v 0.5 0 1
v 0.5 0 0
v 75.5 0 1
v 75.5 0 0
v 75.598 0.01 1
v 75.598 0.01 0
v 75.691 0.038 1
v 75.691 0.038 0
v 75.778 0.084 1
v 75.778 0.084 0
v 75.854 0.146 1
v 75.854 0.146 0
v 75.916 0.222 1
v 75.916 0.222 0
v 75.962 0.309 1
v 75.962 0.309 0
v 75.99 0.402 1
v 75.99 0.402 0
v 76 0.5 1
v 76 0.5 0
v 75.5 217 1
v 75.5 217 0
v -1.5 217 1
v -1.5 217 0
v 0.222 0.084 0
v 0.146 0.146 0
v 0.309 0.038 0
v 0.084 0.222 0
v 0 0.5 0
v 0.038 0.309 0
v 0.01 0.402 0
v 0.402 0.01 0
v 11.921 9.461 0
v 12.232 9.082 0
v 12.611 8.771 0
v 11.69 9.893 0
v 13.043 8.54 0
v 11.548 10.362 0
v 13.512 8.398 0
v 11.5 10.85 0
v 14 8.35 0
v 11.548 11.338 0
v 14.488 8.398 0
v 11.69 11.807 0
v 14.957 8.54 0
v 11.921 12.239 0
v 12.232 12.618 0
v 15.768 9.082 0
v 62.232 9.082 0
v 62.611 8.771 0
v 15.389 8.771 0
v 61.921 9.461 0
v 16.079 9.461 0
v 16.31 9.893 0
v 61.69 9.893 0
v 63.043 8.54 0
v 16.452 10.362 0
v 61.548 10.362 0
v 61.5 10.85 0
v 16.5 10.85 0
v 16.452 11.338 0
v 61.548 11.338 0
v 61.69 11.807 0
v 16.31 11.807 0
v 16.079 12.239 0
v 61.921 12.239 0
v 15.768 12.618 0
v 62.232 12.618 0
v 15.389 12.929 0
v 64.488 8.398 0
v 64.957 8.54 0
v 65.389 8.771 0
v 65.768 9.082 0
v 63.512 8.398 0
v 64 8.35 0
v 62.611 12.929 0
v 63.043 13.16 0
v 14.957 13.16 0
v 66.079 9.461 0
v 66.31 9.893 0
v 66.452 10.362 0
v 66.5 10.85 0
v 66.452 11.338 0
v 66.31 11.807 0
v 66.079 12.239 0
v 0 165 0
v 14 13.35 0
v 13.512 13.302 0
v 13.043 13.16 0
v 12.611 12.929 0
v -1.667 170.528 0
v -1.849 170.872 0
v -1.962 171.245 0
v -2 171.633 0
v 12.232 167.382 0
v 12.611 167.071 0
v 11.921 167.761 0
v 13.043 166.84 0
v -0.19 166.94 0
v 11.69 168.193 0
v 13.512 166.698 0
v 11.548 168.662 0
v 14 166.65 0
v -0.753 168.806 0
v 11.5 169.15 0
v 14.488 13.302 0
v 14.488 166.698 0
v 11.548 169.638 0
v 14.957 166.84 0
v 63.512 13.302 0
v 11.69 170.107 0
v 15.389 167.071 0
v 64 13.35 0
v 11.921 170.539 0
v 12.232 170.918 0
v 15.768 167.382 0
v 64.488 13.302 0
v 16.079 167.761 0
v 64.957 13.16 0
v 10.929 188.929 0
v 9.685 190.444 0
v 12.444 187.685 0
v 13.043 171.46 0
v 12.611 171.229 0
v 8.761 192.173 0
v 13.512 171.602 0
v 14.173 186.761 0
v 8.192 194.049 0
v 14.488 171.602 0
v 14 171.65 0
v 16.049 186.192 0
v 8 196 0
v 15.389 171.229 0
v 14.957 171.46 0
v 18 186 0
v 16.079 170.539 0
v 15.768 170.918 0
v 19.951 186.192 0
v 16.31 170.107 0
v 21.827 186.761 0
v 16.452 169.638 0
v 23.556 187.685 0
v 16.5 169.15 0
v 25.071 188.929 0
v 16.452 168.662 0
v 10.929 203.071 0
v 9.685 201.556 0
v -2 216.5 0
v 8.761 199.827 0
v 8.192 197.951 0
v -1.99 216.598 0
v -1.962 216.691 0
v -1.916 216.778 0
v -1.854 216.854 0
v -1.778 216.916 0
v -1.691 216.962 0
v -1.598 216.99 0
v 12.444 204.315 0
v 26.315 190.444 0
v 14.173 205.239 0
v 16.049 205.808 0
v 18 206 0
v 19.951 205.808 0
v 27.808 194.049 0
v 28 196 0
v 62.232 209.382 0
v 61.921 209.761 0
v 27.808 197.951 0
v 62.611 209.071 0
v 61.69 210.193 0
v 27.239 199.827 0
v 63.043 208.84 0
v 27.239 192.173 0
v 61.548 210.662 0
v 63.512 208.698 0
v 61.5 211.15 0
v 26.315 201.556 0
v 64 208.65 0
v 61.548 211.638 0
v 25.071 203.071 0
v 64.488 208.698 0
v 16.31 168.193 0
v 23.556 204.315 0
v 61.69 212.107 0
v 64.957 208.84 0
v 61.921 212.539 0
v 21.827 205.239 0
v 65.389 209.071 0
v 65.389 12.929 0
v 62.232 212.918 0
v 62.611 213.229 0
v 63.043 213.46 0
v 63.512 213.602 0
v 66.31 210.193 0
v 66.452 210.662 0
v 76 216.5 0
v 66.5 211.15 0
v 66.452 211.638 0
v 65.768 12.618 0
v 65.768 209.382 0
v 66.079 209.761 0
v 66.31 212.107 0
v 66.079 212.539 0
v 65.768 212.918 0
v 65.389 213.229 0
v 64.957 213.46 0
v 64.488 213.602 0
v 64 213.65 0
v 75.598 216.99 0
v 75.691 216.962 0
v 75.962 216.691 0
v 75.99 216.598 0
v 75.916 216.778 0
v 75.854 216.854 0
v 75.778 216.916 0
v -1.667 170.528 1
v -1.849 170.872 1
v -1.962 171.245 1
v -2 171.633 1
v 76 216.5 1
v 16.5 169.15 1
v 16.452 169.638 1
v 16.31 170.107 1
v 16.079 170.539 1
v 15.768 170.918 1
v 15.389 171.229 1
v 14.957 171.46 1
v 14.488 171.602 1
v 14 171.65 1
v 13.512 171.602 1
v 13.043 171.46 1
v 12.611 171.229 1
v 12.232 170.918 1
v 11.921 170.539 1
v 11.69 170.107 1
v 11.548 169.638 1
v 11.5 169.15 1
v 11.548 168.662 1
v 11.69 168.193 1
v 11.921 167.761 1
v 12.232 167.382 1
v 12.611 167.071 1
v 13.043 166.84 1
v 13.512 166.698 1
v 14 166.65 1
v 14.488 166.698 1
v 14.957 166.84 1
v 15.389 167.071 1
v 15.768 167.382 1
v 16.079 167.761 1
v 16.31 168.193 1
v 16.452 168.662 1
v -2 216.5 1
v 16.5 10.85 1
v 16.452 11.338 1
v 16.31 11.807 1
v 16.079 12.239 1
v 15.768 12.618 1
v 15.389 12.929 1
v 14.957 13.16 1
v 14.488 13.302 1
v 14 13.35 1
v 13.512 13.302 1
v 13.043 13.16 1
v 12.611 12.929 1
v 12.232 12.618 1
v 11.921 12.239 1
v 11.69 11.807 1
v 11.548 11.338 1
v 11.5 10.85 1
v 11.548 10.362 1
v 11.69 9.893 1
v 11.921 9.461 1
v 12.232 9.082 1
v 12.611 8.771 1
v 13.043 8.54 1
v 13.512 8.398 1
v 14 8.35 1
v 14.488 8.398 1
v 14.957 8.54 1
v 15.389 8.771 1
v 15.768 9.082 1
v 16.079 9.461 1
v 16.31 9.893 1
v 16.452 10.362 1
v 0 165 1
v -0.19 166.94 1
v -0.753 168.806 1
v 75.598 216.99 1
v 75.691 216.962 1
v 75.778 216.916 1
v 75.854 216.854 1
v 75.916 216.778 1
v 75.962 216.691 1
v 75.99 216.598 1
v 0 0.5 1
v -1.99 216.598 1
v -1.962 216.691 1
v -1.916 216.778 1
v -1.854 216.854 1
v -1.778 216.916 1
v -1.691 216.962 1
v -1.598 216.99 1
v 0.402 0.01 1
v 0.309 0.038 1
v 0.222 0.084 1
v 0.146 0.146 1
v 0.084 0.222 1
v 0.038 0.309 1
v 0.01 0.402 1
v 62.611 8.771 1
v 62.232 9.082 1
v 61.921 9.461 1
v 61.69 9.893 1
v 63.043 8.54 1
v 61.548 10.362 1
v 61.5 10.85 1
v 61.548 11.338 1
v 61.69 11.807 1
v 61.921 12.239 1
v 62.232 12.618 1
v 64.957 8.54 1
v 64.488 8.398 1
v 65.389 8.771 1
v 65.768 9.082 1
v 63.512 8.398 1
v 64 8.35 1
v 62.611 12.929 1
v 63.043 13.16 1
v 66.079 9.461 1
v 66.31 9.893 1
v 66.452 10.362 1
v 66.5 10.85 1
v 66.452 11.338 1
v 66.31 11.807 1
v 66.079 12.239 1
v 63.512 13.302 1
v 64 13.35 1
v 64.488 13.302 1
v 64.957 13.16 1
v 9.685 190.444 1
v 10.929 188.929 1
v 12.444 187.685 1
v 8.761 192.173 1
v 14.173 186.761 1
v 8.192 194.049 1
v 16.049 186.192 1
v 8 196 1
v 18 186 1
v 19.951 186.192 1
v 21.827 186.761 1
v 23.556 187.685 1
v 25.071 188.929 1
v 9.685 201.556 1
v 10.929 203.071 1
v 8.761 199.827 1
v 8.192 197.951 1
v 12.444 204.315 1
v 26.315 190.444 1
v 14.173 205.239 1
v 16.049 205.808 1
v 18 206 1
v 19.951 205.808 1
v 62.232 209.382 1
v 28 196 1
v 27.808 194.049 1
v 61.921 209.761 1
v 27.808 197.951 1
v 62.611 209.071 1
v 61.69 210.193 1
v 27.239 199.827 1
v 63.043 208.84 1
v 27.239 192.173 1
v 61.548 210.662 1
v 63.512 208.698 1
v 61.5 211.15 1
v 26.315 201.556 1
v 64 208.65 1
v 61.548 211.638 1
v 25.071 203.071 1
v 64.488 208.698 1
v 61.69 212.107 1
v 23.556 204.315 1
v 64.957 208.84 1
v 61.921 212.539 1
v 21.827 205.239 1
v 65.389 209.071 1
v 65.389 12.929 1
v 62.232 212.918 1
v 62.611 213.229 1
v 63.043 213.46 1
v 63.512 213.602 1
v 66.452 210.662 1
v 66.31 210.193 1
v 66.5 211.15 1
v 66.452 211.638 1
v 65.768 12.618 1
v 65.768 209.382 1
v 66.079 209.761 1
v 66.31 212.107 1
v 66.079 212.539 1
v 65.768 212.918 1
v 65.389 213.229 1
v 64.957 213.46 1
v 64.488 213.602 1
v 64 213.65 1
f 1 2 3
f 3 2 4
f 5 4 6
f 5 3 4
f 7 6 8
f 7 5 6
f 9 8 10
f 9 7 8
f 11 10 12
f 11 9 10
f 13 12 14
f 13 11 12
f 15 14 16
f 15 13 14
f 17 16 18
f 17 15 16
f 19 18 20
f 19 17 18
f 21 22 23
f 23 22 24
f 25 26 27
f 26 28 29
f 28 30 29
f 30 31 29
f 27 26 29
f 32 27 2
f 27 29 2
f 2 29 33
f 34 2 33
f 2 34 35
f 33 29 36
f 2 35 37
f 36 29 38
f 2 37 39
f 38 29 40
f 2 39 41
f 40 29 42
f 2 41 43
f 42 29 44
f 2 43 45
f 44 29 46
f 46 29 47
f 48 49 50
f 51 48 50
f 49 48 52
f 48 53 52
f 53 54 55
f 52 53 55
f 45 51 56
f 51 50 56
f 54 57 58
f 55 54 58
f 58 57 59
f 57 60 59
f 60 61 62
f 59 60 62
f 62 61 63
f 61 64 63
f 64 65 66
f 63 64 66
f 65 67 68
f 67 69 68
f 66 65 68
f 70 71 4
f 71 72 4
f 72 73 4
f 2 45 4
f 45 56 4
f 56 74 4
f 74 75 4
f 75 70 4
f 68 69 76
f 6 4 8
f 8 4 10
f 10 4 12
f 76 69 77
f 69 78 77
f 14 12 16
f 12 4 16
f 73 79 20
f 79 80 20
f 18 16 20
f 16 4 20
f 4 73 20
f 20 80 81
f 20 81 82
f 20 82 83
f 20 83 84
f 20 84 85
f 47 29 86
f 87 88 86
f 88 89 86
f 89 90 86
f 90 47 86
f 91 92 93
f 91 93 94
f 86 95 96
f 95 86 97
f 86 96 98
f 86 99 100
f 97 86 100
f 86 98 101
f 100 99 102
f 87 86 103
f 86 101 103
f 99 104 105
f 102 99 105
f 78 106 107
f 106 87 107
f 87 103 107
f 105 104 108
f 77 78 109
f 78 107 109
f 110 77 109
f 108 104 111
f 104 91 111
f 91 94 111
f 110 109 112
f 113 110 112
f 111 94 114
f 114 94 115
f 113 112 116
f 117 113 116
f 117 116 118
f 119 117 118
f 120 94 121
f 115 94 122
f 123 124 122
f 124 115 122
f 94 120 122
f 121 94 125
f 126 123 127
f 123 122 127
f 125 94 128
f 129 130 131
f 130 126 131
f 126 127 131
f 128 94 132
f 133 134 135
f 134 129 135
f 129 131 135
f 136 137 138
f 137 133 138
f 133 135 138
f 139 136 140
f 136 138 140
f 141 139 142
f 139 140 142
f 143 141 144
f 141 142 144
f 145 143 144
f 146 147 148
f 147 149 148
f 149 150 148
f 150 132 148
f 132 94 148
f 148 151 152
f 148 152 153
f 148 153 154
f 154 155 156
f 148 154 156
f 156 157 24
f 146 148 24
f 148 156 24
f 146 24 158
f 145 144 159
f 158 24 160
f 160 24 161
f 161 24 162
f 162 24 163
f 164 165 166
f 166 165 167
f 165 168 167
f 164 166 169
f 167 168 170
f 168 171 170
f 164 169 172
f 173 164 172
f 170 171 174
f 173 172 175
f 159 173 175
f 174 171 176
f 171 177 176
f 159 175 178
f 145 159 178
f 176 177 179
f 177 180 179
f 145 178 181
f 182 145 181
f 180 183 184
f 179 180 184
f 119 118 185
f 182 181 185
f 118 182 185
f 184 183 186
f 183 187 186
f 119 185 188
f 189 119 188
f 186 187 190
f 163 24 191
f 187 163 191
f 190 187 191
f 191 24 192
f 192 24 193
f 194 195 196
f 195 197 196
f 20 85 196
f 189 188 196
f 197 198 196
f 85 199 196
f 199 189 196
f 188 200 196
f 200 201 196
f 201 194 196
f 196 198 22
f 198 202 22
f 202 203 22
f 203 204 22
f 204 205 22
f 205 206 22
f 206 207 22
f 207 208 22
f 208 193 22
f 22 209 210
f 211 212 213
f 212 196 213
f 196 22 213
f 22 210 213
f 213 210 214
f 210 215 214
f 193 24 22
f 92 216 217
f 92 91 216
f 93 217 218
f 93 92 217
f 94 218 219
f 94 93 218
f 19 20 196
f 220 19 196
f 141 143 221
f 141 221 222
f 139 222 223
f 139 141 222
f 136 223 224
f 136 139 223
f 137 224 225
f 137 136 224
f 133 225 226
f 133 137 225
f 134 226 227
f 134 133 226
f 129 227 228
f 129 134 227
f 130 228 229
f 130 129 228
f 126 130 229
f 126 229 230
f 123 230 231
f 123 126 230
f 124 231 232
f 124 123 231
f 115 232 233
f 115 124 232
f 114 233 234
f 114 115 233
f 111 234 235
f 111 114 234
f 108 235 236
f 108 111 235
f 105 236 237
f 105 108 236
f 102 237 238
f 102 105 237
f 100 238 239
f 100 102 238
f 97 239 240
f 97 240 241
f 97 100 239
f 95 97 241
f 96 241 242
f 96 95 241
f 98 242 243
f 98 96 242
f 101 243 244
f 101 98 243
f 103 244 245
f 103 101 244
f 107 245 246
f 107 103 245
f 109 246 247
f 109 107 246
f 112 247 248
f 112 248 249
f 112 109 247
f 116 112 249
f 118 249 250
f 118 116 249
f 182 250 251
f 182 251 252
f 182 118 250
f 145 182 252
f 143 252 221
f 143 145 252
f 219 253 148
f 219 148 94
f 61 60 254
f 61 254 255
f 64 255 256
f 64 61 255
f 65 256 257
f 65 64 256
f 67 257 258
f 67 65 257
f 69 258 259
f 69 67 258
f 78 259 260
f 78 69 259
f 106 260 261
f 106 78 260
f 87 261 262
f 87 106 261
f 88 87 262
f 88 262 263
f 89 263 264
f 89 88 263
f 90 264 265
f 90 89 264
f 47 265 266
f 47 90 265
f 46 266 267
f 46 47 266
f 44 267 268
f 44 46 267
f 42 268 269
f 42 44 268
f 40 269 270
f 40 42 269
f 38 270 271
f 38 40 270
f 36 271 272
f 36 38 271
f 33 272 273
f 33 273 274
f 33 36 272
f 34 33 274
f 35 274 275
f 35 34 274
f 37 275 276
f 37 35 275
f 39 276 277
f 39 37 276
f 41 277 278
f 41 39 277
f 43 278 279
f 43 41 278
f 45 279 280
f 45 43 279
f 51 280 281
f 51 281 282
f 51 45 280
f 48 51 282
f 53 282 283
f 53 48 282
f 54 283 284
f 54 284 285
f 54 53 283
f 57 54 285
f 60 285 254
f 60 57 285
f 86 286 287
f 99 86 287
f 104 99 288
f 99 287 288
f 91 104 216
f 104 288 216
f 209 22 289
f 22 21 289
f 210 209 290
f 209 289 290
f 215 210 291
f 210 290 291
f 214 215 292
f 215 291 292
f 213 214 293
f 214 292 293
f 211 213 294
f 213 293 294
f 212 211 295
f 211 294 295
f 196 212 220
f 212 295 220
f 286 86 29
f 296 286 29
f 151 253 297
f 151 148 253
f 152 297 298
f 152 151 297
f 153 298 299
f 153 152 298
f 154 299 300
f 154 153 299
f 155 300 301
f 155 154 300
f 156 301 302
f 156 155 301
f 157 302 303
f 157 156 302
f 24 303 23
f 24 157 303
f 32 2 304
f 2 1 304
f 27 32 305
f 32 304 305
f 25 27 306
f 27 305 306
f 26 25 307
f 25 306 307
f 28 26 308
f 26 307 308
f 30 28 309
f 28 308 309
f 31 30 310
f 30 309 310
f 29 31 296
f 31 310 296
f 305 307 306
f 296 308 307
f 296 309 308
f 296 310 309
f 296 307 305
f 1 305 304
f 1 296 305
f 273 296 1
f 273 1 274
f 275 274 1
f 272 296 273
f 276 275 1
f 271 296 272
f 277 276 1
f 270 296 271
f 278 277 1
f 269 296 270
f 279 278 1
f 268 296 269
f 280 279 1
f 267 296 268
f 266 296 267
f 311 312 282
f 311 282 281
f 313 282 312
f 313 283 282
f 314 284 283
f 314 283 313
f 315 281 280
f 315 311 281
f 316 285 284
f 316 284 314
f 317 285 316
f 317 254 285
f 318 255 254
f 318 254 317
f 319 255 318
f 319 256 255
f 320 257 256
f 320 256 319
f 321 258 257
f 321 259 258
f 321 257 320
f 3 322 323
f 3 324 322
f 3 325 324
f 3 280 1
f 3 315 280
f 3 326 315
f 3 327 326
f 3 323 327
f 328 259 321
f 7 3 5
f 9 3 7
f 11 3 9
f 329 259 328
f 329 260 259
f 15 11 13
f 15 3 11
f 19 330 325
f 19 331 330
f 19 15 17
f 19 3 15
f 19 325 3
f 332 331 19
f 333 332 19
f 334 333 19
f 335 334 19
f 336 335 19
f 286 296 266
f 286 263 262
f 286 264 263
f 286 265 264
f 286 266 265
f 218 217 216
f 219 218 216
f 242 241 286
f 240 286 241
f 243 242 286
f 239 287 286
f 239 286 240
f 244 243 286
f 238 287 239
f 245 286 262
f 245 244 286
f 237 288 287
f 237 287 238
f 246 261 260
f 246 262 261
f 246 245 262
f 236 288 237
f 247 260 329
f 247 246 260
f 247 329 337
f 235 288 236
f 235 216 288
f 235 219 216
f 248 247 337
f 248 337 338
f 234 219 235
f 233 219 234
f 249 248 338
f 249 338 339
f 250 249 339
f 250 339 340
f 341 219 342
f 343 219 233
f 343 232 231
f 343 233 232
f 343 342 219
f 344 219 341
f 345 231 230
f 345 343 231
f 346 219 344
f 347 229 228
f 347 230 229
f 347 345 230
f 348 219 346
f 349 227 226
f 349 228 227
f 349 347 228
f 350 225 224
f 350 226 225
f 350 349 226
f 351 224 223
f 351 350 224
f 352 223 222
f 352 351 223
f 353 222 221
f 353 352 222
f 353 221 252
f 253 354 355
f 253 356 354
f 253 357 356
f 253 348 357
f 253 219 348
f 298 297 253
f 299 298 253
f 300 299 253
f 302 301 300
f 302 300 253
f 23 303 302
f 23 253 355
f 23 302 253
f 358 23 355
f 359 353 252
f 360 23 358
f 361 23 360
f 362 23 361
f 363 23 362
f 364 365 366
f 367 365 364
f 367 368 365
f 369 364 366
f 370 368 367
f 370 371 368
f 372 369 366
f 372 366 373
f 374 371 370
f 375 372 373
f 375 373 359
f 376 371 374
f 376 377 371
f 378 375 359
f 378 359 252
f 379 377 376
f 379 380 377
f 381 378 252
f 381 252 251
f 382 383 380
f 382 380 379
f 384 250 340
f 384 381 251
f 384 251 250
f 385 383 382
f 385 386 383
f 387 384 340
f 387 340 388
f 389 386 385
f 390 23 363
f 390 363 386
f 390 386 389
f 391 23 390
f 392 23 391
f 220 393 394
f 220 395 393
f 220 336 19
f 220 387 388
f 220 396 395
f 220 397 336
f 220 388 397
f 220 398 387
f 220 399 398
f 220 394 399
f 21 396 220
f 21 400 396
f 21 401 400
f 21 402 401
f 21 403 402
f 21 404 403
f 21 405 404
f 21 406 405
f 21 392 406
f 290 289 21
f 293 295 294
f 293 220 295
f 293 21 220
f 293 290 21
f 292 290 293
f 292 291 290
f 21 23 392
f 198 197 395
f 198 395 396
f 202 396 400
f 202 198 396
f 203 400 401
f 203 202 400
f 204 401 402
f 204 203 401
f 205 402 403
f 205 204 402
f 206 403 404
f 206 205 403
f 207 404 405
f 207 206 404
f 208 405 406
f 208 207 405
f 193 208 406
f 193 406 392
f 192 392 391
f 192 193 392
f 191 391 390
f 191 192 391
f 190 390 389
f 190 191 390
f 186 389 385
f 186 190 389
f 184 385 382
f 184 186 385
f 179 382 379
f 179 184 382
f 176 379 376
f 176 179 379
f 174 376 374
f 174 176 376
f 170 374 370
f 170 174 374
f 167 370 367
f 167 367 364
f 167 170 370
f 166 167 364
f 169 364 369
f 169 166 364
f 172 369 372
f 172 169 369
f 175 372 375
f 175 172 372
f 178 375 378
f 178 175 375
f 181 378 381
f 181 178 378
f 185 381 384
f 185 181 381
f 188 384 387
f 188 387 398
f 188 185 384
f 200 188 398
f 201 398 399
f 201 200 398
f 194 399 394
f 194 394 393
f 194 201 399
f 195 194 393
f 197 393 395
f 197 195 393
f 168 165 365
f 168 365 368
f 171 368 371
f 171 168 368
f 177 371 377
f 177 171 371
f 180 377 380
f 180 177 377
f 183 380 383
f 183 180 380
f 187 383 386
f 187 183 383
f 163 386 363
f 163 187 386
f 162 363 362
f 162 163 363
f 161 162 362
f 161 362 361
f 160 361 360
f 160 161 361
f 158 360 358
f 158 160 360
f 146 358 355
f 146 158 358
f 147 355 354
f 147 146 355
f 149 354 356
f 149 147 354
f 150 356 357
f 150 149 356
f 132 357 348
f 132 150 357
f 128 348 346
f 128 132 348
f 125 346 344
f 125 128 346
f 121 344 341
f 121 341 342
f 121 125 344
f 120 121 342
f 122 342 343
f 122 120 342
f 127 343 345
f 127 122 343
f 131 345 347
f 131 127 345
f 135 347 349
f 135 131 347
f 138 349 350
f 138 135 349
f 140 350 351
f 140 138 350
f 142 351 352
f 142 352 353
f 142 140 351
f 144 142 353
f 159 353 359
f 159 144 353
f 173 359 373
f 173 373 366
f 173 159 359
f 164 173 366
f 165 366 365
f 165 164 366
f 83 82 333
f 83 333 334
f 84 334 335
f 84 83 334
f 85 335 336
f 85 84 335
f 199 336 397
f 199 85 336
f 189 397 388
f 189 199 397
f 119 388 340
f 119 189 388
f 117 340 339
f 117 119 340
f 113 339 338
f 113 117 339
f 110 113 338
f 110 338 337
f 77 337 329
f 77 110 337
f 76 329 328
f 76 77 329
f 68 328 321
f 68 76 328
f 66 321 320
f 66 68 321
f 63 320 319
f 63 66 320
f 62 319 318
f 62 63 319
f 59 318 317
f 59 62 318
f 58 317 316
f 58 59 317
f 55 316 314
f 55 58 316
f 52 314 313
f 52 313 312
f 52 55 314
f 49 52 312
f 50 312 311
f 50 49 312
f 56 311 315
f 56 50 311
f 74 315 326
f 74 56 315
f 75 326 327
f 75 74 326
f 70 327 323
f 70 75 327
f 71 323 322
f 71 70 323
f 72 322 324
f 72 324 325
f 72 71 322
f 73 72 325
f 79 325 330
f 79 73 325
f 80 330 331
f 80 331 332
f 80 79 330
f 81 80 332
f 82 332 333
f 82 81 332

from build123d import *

# Parameters (mm, degrees)
SKETCH1_R           = 2.5
SKETCH1_R_2         = 10
BOSS_EXTRUDE1_DEPTH = 1
SKETCH2_R           = 1.5
CUT_EXTRUDE1_DEPTH  = 230.926075076
FILLET1_R           = 0.5
FILLET2_R           = 10
CUT_EXTRUDE2_DEPTH  = 10
FILLET3_R           = 2
FILLET4_R           = 0.5


with BuildPart() as part:
    # Sketch1 → Boss-Extrude1 (new body)
    with BuildSketch(Plane.XY):
        Polygon((0, 0), (76, 0), (76, 217), (-12.55, 217), (-12.55, 212), (-19.55, 212), (-19.55, 217), (-32, 217), (-32, 175), (0, 175), align=None)
        with Locations((14, 169.15)):
            Circle(SKETCH1_R, mode=Mode.SUBTRACT)
        with Locations((14, 10.85)):
            Circle(SKETCH1_R, mode=Mode.SUBTRACT)
        with Locations((64, 10.85)):
            Circle(SKETCH1_R, mode=Mode.SUBTRACT)
        with Locations((64, 211.15)):
            Circle(SKETCH1_R, mode=Mode.SUBTRACT)
        with Locations((18, 196)):
            Circle(SKETCH1_R_2, mode=Mode.SUBTRACT)
        with BuildLine():
            Line((-19.55, 207), (-12.55, 207))
            ThreePointArc((-12.55, 207), (-11.425, 205.875), (-12.55, 204.75))
            Line((-12.55, 204.75), (-19.55, 204.75))
            ThreePointArc((-19.55, 204.75), (-20.675, 205.875), (-19.55, 207))
        make_face(mode=Mode.SUBTRACT)
    extrude(amount=BOSS_EXTRUDE1_DEPTH)

    # Sketch2 → Cut-Extrude1 (cut, through all)
    with BuildSketch(Plane.XY.offset(1)):
        with Locations((-13.610660172, 213.060660172)):
            Circle(SKETCH2_R)
        with Locations((-18.489339828, 213.060660172)):
            Circle(SKETCH2_R)
    extrude(amount=-CUT_EXTRUDE1_DEPTH, mode=Mode.SUBTRACT)

    # Fillet1
    fillet1_edges = [part.edges().sort_by_distance(p)[0] for p in [
        (-32, 217, 0.5),
        (-19.55, 217, 0.5),
        (-12.55, 217, 0.5),
        (76, 217, 0.5),
        (76, 0, 0.5),
        (0, 0, 0.5),
    ]]
    fillet(fillet1_edges, radius=FILLET1_R)

    # Fillet2
    fillet2_edges = [part.edges().sort_by_distance(p)[0] for p in [
        (0, 175, 0.5),
        (-32, 175, 0.5),
    ]]
    fillet(fillet2_edges, radius=FILLET2_R)

    # Sketch4 → Cut-Extrude2 (cut)
    with BuildSketch(Plane.XY.offset(1)):
        with BuildLine():
            Line((-2, 217), (-2, 171))
            ThreePointArc((-2, 171), (-5.865545946, 173.268908108), (-10, 175))
            Line((-10, 175), (-22, 175))
            ThreePointArc((-22, 175), (-29.071067812, 177.928932188), (-32, 185))
            Line((-32, 185), (-32, 216.5))
            ThreePointArc((-32, 216.5), (-31.853553391, 216.853553391), (-31.5, 217))
            Line((-31.5, 217), (-20.05, 217))
            ThreePointArc((-20.05, 217), (-19.696446609, 216.853553391), (-19.55, 216.5))
            Line((-19.55, 216.5), (-19.55, 214.121320344))
            ThreePointArc((-19.55, 214.121320344), (-19.55, 212), (-17.428679656, 212))
            Line((-17.428679656, 212), (-14.671320344, 212))
            ThreePointArc((-14.671320344, 212), (-12.55, 212), (-12.55, 214.121320344))
            Line((-12.55, 214.121320344), (-12.55, 216.5))
            ThreePointArc((-12.55, 216.5), (-12.403553391, 216.853553391), (-12.05, 217))
            Line((-12.05, 217), (-2, 217))
        make_face()
    extrude(amount=-CUT_EXTRUDE2_DEPTH, mode=Mode.SUBTRACT)

    # Fillet3
    fillet3_edges = [part.edges().sort_by_distance(p)[0] for p in [
        (-2, 171, 0.5),
    ]]
    fillet(fillet3_edges, radius=FILLET3_R)

    # Fillet4
    fillet4_edges = [part.edges().sort_by_distance(p)[0] for p in [
        (-2, 217, 0.5),
    ]]
    fillet(fillet4_edges, radius=FILLET4_R)


solid = part.part
